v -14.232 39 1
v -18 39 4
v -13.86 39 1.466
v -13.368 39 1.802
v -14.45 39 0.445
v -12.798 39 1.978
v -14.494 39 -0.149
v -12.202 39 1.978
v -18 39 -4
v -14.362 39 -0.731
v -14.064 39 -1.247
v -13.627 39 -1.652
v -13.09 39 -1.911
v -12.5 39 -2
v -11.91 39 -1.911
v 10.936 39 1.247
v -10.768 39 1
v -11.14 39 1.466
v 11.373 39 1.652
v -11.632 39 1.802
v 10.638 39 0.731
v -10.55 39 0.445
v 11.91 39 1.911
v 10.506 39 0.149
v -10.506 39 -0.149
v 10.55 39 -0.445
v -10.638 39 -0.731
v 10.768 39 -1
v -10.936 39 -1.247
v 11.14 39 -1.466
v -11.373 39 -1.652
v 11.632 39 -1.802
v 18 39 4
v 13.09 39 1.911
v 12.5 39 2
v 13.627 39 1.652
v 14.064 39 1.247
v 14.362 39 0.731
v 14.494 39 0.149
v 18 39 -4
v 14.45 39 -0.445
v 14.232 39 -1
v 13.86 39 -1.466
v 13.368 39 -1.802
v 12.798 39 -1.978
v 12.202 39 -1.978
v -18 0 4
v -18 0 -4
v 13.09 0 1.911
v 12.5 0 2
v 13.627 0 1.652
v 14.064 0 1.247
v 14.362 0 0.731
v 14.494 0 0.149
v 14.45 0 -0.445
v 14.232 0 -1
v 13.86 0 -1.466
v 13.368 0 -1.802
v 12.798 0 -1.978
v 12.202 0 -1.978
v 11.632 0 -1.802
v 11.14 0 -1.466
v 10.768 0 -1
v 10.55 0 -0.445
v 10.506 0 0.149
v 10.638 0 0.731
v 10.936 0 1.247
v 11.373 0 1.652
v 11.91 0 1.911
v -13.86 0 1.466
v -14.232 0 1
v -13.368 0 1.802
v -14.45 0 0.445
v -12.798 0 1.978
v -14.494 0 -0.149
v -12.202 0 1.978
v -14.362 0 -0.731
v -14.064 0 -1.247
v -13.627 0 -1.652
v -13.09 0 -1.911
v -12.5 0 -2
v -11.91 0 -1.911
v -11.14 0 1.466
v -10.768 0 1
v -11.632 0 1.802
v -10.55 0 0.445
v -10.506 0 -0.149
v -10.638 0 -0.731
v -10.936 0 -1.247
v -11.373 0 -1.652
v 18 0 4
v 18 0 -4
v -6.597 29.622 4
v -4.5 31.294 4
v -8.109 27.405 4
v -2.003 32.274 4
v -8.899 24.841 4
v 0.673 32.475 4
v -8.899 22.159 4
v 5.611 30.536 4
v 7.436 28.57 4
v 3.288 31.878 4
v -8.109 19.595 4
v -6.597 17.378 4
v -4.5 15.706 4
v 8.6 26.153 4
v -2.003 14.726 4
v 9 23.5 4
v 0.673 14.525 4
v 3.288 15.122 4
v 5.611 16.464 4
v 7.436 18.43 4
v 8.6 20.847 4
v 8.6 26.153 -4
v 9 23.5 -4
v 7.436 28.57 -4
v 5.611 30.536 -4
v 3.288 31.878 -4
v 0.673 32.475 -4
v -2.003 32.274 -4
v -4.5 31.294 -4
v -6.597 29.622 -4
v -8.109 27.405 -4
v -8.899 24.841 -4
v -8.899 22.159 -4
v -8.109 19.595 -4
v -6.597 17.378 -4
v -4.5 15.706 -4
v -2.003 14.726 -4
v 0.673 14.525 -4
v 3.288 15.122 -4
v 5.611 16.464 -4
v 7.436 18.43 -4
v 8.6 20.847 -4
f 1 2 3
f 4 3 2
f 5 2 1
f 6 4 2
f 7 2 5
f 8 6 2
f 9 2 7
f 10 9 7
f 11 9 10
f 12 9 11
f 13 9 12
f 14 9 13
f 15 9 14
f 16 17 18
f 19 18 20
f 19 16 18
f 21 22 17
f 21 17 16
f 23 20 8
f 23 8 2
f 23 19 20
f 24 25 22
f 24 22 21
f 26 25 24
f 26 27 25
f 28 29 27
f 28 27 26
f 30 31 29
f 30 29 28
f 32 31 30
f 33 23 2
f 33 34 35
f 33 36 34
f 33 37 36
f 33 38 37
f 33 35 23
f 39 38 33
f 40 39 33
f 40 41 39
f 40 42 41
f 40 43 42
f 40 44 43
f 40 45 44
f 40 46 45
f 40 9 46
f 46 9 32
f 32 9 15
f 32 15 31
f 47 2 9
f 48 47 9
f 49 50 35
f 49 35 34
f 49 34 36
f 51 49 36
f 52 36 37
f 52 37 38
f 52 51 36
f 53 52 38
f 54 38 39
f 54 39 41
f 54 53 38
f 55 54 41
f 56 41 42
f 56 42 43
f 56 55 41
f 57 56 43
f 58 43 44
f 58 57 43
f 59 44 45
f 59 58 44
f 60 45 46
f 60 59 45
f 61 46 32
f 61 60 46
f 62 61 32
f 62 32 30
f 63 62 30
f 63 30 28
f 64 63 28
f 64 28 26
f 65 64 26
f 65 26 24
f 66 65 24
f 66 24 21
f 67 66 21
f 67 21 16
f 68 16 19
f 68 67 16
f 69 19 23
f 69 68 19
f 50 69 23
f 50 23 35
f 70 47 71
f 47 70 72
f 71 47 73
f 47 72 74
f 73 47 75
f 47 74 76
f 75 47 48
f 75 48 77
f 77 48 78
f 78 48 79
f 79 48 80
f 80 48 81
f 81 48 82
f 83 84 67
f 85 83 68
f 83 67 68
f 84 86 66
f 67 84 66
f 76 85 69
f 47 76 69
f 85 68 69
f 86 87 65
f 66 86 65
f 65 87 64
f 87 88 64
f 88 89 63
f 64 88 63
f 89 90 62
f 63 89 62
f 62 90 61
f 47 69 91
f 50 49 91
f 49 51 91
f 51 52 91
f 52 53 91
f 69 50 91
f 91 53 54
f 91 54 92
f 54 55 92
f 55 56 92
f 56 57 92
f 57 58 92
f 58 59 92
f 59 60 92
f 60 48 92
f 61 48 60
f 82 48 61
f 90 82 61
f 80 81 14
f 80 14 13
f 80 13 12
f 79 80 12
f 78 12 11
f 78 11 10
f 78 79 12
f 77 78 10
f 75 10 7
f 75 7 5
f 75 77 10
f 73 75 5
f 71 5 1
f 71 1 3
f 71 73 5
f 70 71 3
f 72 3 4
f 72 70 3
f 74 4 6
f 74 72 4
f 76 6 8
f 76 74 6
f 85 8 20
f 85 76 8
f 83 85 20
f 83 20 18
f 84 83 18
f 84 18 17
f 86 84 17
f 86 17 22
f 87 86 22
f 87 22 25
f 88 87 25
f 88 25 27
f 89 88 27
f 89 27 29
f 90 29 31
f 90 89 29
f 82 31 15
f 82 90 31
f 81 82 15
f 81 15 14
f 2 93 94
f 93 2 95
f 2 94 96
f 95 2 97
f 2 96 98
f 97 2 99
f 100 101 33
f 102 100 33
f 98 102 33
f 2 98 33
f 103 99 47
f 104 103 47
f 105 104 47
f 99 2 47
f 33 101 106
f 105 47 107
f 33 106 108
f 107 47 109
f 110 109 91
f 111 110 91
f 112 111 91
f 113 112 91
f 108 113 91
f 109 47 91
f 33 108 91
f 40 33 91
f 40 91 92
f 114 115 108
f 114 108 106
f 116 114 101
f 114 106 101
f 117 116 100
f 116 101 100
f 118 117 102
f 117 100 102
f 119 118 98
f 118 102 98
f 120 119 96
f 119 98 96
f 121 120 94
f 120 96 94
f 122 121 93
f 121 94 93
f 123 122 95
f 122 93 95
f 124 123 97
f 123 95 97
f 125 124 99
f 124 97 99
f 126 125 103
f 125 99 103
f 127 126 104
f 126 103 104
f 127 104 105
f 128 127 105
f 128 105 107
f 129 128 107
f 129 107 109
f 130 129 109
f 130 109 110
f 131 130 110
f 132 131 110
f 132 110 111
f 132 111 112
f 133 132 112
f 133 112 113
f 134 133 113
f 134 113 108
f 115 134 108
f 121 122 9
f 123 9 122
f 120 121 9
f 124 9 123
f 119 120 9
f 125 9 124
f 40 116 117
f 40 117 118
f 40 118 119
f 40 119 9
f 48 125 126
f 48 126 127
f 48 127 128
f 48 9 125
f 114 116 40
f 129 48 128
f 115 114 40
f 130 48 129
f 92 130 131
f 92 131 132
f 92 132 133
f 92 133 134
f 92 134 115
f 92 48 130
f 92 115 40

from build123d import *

# Parameters (mm, degrees)
SKETCH_1_W          = 36
SKETCH_1_H          = 8
SKETCH_1_R          = 2
EXTRUDE_1_DEPTH     = 39
SKETCH_3_R          = 9
CUT_EXTRUDE_1_DEPTH = 10


with BuildPart() as part:
    # 草图1 → 凸台-拉伸1 (new body)
    with BuildSketch(Plane(origin=(0, 0, 0), x_dir=(1, 0, 0), z_dir=(0, 1, 0))):
        Rectangle(SKETCH_1_W, SKETCH_1_H)
        with Locations(Location((12.5, 0, 0), (0, 0, 270))):
            Circle(SKETCH_1_R, mode=Mode.SUBTRACT)
        with Locations(Location((-12.5, 0, 0), (0, 0, 90))):
            Circle(SKETCH_1_R, mode=Mode.SUBTRACT)
    extrude(amount=EXTRUDE_1_DEPTH)

    # 草图3 → 切除-拉伸1 (cut)
    with BuildSketch(Plane.XY.offset(4)):
        with Locations((0, 23.5)):
            Circle(SKETCH_3_R)
    extrude(amount=-CUT_EXTRUDE_1_DEPTH, mode=Mode.SUBTRACT)


solid = part.part
